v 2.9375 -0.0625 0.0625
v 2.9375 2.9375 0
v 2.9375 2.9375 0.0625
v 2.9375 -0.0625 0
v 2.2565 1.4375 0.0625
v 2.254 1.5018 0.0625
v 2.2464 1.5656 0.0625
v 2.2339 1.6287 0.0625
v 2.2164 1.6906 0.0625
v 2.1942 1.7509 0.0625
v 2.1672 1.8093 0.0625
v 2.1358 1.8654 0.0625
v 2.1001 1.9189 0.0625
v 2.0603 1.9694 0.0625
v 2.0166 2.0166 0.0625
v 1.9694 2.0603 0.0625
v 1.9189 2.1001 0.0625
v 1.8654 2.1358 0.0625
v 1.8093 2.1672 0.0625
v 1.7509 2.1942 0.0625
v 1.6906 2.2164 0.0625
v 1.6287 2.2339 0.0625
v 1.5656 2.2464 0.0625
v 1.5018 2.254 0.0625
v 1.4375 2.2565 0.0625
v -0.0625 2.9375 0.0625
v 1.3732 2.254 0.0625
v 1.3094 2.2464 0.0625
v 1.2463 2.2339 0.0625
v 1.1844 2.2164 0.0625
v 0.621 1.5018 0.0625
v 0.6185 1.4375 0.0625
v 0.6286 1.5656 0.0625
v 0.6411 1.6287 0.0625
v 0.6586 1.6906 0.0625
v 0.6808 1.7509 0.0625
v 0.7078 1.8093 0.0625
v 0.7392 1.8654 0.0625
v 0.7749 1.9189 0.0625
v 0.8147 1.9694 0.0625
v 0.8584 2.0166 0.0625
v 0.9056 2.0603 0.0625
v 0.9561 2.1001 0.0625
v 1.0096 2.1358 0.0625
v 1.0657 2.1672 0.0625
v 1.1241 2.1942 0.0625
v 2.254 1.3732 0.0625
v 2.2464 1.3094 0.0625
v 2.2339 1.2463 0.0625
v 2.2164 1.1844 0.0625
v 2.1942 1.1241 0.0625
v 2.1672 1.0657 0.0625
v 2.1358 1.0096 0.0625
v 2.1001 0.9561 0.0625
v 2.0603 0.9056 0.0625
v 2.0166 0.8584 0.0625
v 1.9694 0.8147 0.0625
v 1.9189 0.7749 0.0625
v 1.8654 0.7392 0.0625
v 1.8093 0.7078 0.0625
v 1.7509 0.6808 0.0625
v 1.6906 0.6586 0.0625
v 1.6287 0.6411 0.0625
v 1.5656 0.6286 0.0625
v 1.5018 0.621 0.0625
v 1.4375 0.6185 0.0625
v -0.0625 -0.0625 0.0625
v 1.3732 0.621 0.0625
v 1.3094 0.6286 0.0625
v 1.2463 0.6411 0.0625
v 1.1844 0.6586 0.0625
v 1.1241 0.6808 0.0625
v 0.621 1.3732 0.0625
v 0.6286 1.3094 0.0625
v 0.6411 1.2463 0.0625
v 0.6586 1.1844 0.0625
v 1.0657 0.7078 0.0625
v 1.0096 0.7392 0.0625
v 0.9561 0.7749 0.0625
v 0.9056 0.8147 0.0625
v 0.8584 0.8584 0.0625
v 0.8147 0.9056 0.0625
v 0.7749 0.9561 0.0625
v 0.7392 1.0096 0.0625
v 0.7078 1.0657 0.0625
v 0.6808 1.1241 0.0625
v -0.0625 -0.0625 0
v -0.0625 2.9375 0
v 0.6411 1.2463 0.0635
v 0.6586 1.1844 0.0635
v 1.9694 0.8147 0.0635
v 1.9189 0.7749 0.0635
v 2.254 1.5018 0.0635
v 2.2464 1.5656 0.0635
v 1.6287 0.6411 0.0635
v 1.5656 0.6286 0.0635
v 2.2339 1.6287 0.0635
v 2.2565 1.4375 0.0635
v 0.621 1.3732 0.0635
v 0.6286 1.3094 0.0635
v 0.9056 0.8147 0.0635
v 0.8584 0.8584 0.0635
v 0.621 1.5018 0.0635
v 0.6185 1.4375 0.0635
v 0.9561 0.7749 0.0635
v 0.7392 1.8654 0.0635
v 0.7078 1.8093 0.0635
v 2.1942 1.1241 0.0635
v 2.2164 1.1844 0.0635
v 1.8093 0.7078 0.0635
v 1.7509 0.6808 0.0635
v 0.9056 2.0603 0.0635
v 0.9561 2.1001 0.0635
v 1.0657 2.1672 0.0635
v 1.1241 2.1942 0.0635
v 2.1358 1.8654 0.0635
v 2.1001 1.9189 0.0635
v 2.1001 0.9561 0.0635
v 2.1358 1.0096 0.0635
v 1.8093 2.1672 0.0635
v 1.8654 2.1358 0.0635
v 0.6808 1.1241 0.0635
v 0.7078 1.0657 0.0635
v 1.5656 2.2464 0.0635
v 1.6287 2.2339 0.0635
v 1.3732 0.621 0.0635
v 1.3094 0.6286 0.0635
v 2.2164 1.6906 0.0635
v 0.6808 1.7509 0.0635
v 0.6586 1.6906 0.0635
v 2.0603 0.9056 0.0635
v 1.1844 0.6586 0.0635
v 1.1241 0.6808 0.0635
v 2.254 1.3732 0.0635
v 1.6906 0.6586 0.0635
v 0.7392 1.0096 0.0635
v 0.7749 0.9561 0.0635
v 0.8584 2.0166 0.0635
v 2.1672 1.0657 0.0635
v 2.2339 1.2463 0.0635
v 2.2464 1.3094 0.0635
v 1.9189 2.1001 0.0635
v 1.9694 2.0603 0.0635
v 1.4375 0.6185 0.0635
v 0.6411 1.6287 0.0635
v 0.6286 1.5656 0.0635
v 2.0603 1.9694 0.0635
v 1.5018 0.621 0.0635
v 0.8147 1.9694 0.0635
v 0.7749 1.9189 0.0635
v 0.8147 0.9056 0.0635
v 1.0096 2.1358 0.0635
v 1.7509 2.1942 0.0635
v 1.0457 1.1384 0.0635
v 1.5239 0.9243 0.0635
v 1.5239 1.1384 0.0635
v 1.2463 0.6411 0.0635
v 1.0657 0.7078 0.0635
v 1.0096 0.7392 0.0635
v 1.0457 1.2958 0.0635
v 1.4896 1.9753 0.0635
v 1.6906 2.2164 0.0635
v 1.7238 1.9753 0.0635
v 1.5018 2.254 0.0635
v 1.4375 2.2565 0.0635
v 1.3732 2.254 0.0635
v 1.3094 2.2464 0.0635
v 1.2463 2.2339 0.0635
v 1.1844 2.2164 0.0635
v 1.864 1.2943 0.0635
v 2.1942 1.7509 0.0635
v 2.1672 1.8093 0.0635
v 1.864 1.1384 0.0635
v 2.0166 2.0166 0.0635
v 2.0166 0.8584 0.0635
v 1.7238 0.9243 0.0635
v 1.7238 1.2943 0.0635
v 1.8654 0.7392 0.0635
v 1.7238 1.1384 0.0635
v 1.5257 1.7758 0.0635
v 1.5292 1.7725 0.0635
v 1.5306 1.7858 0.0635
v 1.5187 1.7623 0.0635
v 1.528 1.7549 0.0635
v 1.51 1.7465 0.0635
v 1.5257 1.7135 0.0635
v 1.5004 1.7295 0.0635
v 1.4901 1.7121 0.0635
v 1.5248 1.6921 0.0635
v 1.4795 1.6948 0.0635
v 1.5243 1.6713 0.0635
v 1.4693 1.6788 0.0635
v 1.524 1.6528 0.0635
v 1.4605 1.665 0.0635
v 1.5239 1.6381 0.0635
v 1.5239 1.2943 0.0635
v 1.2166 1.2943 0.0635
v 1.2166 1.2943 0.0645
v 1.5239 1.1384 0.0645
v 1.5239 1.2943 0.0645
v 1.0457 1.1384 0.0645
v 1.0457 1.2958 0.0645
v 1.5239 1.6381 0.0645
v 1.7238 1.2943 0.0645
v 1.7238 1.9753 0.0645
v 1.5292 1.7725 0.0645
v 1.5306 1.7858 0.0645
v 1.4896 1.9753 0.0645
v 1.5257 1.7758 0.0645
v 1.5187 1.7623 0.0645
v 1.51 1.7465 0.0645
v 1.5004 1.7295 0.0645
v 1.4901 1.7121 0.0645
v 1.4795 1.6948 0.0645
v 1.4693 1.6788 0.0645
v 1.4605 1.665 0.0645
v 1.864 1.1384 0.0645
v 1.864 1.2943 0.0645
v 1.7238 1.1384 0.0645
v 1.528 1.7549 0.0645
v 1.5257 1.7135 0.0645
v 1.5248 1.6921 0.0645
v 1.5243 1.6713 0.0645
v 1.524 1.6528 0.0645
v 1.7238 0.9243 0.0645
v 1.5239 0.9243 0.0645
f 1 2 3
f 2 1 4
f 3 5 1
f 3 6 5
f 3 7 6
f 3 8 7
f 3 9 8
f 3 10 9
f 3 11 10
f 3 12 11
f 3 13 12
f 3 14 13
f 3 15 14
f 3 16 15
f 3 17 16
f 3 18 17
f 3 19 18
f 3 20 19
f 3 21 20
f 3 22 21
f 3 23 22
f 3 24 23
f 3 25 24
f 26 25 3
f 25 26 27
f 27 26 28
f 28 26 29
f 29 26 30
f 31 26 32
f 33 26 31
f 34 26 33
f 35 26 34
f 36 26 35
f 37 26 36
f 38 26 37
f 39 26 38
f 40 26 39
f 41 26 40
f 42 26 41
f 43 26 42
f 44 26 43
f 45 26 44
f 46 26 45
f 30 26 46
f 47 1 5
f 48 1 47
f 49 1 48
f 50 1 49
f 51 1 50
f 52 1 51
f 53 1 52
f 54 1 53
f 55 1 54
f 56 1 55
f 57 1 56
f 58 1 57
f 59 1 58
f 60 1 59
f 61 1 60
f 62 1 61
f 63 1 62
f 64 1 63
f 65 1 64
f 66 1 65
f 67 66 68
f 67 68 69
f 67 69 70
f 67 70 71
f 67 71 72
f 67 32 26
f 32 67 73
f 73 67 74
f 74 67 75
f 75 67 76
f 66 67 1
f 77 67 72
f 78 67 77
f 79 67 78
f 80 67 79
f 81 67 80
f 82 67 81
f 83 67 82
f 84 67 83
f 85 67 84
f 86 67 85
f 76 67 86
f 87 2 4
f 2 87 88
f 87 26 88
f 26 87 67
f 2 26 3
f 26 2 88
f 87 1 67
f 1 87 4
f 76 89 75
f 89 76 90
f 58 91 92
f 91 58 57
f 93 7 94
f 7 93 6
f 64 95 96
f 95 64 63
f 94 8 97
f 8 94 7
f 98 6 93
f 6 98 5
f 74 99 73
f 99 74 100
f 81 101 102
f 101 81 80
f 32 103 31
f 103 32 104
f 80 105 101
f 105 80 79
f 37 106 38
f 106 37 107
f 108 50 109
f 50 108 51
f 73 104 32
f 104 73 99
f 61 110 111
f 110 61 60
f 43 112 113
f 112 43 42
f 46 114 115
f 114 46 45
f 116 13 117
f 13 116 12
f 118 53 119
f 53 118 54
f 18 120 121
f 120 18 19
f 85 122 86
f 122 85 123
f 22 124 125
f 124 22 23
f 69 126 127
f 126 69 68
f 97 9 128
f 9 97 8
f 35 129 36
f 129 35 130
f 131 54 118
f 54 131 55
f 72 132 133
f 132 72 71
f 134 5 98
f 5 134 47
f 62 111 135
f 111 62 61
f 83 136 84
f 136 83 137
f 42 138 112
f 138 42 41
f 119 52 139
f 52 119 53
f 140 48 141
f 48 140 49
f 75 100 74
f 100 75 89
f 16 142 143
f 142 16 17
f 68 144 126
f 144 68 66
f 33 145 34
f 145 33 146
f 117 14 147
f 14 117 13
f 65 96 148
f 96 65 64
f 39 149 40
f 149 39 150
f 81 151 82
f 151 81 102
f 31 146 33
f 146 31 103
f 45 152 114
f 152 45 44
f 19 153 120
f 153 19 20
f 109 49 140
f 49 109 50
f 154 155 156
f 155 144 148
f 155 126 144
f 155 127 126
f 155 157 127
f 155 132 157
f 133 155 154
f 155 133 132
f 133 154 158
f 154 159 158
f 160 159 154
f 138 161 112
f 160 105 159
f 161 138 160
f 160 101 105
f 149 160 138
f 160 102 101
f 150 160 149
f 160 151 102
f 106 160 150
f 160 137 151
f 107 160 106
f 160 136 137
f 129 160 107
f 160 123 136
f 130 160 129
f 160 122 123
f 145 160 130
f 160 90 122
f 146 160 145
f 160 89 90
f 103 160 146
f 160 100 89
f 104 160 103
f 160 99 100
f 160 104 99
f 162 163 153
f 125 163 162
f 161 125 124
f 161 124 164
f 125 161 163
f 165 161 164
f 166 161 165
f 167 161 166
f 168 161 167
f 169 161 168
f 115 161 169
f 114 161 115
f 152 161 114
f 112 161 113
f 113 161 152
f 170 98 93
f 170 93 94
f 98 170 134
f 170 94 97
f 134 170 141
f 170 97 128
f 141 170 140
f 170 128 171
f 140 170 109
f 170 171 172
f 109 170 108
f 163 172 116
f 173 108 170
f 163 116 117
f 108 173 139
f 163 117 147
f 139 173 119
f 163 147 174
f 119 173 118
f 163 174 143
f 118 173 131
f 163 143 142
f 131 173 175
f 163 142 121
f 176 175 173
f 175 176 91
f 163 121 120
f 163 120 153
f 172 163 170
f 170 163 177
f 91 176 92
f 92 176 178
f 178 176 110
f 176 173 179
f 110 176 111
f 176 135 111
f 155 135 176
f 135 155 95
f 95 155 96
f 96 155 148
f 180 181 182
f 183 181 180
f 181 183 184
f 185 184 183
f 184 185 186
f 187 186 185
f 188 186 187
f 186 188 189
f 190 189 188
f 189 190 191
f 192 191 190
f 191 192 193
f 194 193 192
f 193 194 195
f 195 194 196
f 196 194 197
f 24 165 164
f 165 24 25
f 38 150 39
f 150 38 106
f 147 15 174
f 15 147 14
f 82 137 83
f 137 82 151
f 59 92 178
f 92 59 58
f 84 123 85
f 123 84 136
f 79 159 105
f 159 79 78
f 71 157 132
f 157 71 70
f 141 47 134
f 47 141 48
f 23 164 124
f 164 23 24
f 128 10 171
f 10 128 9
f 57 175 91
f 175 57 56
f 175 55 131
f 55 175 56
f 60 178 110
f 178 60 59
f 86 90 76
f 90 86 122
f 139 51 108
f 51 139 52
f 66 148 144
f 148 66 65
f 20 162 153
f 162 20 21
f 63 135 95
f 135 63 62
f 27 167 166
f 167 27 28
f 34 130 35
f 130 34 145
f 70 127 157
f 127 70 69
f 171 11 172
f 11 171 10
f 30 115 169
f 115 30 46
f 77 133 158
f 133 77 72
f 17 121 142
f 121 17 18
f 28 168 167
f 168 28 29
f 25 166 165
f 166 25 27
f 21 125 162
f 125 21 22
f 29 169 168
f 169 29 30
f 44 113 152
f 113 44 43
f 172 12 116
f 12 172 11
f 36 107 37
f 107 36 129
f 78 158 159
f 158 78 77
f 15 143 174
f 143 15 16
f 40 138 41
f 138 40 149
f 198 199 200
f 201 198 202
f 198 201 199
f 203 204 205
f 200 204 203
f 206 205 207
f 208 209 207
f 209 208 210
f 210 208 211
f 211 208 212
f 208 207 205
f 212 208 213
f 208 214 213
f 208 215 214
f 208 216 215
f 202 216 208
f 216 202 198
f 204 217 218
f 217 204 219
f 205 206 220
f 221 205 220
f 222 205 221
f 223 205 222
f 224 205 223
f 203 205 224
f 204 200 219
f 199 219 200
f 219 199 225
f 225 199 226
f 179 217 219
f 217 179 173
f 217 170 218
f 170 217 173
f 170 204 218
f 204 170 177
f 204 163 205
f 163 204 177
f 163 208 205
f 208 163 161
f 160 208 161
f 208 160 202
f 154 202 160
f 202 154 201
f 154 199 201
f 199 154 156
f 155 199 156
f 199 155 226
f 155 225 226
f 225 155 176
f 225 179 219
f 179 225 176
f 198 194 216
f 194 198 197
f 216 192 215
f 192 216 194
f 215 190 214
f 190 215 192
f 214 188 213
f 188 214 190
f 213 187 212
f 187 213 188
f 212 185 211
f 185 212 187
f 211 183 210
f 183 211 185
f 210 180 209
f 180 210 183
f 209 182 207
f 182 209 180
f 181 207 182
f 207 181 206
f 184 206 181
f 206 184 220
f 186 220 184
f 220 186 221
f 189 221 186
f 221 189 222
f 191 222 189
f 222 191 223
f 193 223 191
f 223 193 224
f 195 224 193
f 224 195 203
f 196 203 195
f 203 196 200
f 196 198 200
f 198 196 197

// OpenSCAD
// element110.scad
// Spur gear tile — centered black gear ring with trapezoidal teeth.
// The open bore reveals a lighter interior (gear_bore module).
// Units: inches

plate_w = 2 + 7/8;
plate_d = 2 + 7/8;
plate_h = 1/16;
frame_w = 1/16;

hole_d = 3/32;
hole_r = hole_d / 2;

// Gear geometry — centered on tile
gear_n      = 20;    // number of teeth
gear_r_tip  = 1.18;  // outer radius at tooth tips
gear_r_root = 1.00;  // root radius at base of teeth
gear_r_bore = 0.82;  // bore (inner hole) radius
tooth_hw    = 4.5;   // half-angle of each tooth in degrees (total = 9°, gap = 9°)
tooth_tip_f = 0.80;  // tooth tip is narrower than base by this factor

// ── Standard modules ─────────────────────────────────────────────────────────

module rivet_holes() {
    spacing_x = plate_w / 10;
    spacing_y = plate_d / 10;
    inset_x   = spacing_x / 2;
    inset_y   = spacing_y / 2;
    // Front edge
    for (i = [0:9])
        translate([inset_x + i * spacing_x, inset_y,         -1])
            cylinder(h = plate_h + 2, r = hole_r, $fn = 20);
    // Back edge
    for (i = [0:9])
        translate([inset_x + i * spacing_x, plate_d - inset_y, -1])
            cylinder(h = plate_h + 2, r = hole_r, $fn = 20);
    // Left edge
    for (i = [0:9])
        translate([inset_x,           inset_y + i * spacing_y, -1])
            cylinder(h = plate_h + 2, r = hole_r, $fn = 20);
    // Right edge
    for (i = [0:9])
        translate([plate_w - inset_x, inset_y + i * spacing_y, -1])
            cylinder(h = plate_h + 2, r = hole_r, $fn = 20);
}

module frame() {
    color("black")
    difference() {
        translate([-frame_w, -frame_w, 0])
            cube([plate_w + 2 * frame_w, plate_d + 2 * frame_w, plate_h]);
        translate([0, 0, -0.001])
            cube([plate_w, plate_d, plate_h + 0.002]);
    }
}

module plate() {
    difference() {
        color("darkgray")
            cube([plate_w, plate_d, plate_h]);
        rivet_holes();
    }
}

rivet_h = plate_h;
module rivets() {
    spacing_x = plate_w / 10;
    spacing_y = plate_d / 10;
    inset_x   = spacing_x / 2;
    inset_y   = spacing_y / 2;
    color("lightgray") {
        for (i = [0:9])
            translate([inset_x + i * spacing_x, inset_y,         0])
                cylinder(h = rivet_h, r = hole_r, $fn = 20);
        for (i = [0:9])
            translate([inset_x + i * spacing_x, plate_d - inset_y, 0])
                cylinder(h = rivet_h, r = hole_r, $fn = 20);
        for (i = [0:9])
            translate([inset_x,           inset_y + i * spacing_y, 0])
                cylinder(h = rivet_h, r = hole_r, $fn = 20);
        for (i = [0:9])
            translate([plate_w - inset_x, inset_y + i * spacing_y, 0])
                cylinder(h = rivet_h, r = hole_r, $fn = 20);
    }
}

// ── Gear modules ─────────────────────────────────────────────────────────────

// Single trapezoidal tooth pointing in +x direction (before rotation)
module gear_tooth_2d() {
    polygon([
        [gear_r_root * cos(-tooth_hw),             gear_r_root * sin(-tooth_hw)],
        [gear_r_tip  * cos(-tooth_hw * tooth_tip_f), gear_r_tip  * sin(-tooth_hw * tooth_tip_f)],
        [gear_r_tip  * cos( tooth_hw * tooth_tip_f), gear_r_tip  * sin( tooth_hw * tooth_tip_f)],
        [gear_r_root * cos( tooth_hw),             gear_r_root * sin( tooth_hw)],
    ]);
}

// Full 2D gear profile (ring + teeth, without bore subtracted)
module gear_2d() {
    pitch = 360 / gear_n;
    union() {
        circle(r = gear_r_root, $fn = gear_n * 8);
        for (i = [0:gear_n - 1])
            rotate([0, 0, i * pitch])
                gear_tooth_2d();
    }
}

// Black gear ring + teeth with open bore
module gear() {
    color("black")
    translate([plate_w / 2, plate_d / 2, 0])
    linear_extrude(plate_h)
    difference() {
        gear_2d();
        circle(r = gear_r_bore, $fn = 80);
    }
}

// Lighter fill inside the bore (silver interior visible through center)
module gear_bore() {
    color([0.80, 0.80, 0.80])
    translate([plate_w / 2, plate_d / 2, 0])
    linear_extrude(plate_h + 0.001)
    circle(r = gear_r_bore - 0.001, $fn = 80);
}

// Green "1" centered inside the bore
module gear_label() {
    color("green")
    translate([plate_w / 2, plate_d / 2, 0])
    linear_extrude(plate_h + 0.002)
    text("4", size = 1.1, halign = "center", valign = "center",
         font = "Liberation Sans:style=Bold");
}

// ── Assembly ─────────────────────────────────────────────────────────────────

frame();
plate();
rivets();
gear_bore();
gear();
gear_label();
